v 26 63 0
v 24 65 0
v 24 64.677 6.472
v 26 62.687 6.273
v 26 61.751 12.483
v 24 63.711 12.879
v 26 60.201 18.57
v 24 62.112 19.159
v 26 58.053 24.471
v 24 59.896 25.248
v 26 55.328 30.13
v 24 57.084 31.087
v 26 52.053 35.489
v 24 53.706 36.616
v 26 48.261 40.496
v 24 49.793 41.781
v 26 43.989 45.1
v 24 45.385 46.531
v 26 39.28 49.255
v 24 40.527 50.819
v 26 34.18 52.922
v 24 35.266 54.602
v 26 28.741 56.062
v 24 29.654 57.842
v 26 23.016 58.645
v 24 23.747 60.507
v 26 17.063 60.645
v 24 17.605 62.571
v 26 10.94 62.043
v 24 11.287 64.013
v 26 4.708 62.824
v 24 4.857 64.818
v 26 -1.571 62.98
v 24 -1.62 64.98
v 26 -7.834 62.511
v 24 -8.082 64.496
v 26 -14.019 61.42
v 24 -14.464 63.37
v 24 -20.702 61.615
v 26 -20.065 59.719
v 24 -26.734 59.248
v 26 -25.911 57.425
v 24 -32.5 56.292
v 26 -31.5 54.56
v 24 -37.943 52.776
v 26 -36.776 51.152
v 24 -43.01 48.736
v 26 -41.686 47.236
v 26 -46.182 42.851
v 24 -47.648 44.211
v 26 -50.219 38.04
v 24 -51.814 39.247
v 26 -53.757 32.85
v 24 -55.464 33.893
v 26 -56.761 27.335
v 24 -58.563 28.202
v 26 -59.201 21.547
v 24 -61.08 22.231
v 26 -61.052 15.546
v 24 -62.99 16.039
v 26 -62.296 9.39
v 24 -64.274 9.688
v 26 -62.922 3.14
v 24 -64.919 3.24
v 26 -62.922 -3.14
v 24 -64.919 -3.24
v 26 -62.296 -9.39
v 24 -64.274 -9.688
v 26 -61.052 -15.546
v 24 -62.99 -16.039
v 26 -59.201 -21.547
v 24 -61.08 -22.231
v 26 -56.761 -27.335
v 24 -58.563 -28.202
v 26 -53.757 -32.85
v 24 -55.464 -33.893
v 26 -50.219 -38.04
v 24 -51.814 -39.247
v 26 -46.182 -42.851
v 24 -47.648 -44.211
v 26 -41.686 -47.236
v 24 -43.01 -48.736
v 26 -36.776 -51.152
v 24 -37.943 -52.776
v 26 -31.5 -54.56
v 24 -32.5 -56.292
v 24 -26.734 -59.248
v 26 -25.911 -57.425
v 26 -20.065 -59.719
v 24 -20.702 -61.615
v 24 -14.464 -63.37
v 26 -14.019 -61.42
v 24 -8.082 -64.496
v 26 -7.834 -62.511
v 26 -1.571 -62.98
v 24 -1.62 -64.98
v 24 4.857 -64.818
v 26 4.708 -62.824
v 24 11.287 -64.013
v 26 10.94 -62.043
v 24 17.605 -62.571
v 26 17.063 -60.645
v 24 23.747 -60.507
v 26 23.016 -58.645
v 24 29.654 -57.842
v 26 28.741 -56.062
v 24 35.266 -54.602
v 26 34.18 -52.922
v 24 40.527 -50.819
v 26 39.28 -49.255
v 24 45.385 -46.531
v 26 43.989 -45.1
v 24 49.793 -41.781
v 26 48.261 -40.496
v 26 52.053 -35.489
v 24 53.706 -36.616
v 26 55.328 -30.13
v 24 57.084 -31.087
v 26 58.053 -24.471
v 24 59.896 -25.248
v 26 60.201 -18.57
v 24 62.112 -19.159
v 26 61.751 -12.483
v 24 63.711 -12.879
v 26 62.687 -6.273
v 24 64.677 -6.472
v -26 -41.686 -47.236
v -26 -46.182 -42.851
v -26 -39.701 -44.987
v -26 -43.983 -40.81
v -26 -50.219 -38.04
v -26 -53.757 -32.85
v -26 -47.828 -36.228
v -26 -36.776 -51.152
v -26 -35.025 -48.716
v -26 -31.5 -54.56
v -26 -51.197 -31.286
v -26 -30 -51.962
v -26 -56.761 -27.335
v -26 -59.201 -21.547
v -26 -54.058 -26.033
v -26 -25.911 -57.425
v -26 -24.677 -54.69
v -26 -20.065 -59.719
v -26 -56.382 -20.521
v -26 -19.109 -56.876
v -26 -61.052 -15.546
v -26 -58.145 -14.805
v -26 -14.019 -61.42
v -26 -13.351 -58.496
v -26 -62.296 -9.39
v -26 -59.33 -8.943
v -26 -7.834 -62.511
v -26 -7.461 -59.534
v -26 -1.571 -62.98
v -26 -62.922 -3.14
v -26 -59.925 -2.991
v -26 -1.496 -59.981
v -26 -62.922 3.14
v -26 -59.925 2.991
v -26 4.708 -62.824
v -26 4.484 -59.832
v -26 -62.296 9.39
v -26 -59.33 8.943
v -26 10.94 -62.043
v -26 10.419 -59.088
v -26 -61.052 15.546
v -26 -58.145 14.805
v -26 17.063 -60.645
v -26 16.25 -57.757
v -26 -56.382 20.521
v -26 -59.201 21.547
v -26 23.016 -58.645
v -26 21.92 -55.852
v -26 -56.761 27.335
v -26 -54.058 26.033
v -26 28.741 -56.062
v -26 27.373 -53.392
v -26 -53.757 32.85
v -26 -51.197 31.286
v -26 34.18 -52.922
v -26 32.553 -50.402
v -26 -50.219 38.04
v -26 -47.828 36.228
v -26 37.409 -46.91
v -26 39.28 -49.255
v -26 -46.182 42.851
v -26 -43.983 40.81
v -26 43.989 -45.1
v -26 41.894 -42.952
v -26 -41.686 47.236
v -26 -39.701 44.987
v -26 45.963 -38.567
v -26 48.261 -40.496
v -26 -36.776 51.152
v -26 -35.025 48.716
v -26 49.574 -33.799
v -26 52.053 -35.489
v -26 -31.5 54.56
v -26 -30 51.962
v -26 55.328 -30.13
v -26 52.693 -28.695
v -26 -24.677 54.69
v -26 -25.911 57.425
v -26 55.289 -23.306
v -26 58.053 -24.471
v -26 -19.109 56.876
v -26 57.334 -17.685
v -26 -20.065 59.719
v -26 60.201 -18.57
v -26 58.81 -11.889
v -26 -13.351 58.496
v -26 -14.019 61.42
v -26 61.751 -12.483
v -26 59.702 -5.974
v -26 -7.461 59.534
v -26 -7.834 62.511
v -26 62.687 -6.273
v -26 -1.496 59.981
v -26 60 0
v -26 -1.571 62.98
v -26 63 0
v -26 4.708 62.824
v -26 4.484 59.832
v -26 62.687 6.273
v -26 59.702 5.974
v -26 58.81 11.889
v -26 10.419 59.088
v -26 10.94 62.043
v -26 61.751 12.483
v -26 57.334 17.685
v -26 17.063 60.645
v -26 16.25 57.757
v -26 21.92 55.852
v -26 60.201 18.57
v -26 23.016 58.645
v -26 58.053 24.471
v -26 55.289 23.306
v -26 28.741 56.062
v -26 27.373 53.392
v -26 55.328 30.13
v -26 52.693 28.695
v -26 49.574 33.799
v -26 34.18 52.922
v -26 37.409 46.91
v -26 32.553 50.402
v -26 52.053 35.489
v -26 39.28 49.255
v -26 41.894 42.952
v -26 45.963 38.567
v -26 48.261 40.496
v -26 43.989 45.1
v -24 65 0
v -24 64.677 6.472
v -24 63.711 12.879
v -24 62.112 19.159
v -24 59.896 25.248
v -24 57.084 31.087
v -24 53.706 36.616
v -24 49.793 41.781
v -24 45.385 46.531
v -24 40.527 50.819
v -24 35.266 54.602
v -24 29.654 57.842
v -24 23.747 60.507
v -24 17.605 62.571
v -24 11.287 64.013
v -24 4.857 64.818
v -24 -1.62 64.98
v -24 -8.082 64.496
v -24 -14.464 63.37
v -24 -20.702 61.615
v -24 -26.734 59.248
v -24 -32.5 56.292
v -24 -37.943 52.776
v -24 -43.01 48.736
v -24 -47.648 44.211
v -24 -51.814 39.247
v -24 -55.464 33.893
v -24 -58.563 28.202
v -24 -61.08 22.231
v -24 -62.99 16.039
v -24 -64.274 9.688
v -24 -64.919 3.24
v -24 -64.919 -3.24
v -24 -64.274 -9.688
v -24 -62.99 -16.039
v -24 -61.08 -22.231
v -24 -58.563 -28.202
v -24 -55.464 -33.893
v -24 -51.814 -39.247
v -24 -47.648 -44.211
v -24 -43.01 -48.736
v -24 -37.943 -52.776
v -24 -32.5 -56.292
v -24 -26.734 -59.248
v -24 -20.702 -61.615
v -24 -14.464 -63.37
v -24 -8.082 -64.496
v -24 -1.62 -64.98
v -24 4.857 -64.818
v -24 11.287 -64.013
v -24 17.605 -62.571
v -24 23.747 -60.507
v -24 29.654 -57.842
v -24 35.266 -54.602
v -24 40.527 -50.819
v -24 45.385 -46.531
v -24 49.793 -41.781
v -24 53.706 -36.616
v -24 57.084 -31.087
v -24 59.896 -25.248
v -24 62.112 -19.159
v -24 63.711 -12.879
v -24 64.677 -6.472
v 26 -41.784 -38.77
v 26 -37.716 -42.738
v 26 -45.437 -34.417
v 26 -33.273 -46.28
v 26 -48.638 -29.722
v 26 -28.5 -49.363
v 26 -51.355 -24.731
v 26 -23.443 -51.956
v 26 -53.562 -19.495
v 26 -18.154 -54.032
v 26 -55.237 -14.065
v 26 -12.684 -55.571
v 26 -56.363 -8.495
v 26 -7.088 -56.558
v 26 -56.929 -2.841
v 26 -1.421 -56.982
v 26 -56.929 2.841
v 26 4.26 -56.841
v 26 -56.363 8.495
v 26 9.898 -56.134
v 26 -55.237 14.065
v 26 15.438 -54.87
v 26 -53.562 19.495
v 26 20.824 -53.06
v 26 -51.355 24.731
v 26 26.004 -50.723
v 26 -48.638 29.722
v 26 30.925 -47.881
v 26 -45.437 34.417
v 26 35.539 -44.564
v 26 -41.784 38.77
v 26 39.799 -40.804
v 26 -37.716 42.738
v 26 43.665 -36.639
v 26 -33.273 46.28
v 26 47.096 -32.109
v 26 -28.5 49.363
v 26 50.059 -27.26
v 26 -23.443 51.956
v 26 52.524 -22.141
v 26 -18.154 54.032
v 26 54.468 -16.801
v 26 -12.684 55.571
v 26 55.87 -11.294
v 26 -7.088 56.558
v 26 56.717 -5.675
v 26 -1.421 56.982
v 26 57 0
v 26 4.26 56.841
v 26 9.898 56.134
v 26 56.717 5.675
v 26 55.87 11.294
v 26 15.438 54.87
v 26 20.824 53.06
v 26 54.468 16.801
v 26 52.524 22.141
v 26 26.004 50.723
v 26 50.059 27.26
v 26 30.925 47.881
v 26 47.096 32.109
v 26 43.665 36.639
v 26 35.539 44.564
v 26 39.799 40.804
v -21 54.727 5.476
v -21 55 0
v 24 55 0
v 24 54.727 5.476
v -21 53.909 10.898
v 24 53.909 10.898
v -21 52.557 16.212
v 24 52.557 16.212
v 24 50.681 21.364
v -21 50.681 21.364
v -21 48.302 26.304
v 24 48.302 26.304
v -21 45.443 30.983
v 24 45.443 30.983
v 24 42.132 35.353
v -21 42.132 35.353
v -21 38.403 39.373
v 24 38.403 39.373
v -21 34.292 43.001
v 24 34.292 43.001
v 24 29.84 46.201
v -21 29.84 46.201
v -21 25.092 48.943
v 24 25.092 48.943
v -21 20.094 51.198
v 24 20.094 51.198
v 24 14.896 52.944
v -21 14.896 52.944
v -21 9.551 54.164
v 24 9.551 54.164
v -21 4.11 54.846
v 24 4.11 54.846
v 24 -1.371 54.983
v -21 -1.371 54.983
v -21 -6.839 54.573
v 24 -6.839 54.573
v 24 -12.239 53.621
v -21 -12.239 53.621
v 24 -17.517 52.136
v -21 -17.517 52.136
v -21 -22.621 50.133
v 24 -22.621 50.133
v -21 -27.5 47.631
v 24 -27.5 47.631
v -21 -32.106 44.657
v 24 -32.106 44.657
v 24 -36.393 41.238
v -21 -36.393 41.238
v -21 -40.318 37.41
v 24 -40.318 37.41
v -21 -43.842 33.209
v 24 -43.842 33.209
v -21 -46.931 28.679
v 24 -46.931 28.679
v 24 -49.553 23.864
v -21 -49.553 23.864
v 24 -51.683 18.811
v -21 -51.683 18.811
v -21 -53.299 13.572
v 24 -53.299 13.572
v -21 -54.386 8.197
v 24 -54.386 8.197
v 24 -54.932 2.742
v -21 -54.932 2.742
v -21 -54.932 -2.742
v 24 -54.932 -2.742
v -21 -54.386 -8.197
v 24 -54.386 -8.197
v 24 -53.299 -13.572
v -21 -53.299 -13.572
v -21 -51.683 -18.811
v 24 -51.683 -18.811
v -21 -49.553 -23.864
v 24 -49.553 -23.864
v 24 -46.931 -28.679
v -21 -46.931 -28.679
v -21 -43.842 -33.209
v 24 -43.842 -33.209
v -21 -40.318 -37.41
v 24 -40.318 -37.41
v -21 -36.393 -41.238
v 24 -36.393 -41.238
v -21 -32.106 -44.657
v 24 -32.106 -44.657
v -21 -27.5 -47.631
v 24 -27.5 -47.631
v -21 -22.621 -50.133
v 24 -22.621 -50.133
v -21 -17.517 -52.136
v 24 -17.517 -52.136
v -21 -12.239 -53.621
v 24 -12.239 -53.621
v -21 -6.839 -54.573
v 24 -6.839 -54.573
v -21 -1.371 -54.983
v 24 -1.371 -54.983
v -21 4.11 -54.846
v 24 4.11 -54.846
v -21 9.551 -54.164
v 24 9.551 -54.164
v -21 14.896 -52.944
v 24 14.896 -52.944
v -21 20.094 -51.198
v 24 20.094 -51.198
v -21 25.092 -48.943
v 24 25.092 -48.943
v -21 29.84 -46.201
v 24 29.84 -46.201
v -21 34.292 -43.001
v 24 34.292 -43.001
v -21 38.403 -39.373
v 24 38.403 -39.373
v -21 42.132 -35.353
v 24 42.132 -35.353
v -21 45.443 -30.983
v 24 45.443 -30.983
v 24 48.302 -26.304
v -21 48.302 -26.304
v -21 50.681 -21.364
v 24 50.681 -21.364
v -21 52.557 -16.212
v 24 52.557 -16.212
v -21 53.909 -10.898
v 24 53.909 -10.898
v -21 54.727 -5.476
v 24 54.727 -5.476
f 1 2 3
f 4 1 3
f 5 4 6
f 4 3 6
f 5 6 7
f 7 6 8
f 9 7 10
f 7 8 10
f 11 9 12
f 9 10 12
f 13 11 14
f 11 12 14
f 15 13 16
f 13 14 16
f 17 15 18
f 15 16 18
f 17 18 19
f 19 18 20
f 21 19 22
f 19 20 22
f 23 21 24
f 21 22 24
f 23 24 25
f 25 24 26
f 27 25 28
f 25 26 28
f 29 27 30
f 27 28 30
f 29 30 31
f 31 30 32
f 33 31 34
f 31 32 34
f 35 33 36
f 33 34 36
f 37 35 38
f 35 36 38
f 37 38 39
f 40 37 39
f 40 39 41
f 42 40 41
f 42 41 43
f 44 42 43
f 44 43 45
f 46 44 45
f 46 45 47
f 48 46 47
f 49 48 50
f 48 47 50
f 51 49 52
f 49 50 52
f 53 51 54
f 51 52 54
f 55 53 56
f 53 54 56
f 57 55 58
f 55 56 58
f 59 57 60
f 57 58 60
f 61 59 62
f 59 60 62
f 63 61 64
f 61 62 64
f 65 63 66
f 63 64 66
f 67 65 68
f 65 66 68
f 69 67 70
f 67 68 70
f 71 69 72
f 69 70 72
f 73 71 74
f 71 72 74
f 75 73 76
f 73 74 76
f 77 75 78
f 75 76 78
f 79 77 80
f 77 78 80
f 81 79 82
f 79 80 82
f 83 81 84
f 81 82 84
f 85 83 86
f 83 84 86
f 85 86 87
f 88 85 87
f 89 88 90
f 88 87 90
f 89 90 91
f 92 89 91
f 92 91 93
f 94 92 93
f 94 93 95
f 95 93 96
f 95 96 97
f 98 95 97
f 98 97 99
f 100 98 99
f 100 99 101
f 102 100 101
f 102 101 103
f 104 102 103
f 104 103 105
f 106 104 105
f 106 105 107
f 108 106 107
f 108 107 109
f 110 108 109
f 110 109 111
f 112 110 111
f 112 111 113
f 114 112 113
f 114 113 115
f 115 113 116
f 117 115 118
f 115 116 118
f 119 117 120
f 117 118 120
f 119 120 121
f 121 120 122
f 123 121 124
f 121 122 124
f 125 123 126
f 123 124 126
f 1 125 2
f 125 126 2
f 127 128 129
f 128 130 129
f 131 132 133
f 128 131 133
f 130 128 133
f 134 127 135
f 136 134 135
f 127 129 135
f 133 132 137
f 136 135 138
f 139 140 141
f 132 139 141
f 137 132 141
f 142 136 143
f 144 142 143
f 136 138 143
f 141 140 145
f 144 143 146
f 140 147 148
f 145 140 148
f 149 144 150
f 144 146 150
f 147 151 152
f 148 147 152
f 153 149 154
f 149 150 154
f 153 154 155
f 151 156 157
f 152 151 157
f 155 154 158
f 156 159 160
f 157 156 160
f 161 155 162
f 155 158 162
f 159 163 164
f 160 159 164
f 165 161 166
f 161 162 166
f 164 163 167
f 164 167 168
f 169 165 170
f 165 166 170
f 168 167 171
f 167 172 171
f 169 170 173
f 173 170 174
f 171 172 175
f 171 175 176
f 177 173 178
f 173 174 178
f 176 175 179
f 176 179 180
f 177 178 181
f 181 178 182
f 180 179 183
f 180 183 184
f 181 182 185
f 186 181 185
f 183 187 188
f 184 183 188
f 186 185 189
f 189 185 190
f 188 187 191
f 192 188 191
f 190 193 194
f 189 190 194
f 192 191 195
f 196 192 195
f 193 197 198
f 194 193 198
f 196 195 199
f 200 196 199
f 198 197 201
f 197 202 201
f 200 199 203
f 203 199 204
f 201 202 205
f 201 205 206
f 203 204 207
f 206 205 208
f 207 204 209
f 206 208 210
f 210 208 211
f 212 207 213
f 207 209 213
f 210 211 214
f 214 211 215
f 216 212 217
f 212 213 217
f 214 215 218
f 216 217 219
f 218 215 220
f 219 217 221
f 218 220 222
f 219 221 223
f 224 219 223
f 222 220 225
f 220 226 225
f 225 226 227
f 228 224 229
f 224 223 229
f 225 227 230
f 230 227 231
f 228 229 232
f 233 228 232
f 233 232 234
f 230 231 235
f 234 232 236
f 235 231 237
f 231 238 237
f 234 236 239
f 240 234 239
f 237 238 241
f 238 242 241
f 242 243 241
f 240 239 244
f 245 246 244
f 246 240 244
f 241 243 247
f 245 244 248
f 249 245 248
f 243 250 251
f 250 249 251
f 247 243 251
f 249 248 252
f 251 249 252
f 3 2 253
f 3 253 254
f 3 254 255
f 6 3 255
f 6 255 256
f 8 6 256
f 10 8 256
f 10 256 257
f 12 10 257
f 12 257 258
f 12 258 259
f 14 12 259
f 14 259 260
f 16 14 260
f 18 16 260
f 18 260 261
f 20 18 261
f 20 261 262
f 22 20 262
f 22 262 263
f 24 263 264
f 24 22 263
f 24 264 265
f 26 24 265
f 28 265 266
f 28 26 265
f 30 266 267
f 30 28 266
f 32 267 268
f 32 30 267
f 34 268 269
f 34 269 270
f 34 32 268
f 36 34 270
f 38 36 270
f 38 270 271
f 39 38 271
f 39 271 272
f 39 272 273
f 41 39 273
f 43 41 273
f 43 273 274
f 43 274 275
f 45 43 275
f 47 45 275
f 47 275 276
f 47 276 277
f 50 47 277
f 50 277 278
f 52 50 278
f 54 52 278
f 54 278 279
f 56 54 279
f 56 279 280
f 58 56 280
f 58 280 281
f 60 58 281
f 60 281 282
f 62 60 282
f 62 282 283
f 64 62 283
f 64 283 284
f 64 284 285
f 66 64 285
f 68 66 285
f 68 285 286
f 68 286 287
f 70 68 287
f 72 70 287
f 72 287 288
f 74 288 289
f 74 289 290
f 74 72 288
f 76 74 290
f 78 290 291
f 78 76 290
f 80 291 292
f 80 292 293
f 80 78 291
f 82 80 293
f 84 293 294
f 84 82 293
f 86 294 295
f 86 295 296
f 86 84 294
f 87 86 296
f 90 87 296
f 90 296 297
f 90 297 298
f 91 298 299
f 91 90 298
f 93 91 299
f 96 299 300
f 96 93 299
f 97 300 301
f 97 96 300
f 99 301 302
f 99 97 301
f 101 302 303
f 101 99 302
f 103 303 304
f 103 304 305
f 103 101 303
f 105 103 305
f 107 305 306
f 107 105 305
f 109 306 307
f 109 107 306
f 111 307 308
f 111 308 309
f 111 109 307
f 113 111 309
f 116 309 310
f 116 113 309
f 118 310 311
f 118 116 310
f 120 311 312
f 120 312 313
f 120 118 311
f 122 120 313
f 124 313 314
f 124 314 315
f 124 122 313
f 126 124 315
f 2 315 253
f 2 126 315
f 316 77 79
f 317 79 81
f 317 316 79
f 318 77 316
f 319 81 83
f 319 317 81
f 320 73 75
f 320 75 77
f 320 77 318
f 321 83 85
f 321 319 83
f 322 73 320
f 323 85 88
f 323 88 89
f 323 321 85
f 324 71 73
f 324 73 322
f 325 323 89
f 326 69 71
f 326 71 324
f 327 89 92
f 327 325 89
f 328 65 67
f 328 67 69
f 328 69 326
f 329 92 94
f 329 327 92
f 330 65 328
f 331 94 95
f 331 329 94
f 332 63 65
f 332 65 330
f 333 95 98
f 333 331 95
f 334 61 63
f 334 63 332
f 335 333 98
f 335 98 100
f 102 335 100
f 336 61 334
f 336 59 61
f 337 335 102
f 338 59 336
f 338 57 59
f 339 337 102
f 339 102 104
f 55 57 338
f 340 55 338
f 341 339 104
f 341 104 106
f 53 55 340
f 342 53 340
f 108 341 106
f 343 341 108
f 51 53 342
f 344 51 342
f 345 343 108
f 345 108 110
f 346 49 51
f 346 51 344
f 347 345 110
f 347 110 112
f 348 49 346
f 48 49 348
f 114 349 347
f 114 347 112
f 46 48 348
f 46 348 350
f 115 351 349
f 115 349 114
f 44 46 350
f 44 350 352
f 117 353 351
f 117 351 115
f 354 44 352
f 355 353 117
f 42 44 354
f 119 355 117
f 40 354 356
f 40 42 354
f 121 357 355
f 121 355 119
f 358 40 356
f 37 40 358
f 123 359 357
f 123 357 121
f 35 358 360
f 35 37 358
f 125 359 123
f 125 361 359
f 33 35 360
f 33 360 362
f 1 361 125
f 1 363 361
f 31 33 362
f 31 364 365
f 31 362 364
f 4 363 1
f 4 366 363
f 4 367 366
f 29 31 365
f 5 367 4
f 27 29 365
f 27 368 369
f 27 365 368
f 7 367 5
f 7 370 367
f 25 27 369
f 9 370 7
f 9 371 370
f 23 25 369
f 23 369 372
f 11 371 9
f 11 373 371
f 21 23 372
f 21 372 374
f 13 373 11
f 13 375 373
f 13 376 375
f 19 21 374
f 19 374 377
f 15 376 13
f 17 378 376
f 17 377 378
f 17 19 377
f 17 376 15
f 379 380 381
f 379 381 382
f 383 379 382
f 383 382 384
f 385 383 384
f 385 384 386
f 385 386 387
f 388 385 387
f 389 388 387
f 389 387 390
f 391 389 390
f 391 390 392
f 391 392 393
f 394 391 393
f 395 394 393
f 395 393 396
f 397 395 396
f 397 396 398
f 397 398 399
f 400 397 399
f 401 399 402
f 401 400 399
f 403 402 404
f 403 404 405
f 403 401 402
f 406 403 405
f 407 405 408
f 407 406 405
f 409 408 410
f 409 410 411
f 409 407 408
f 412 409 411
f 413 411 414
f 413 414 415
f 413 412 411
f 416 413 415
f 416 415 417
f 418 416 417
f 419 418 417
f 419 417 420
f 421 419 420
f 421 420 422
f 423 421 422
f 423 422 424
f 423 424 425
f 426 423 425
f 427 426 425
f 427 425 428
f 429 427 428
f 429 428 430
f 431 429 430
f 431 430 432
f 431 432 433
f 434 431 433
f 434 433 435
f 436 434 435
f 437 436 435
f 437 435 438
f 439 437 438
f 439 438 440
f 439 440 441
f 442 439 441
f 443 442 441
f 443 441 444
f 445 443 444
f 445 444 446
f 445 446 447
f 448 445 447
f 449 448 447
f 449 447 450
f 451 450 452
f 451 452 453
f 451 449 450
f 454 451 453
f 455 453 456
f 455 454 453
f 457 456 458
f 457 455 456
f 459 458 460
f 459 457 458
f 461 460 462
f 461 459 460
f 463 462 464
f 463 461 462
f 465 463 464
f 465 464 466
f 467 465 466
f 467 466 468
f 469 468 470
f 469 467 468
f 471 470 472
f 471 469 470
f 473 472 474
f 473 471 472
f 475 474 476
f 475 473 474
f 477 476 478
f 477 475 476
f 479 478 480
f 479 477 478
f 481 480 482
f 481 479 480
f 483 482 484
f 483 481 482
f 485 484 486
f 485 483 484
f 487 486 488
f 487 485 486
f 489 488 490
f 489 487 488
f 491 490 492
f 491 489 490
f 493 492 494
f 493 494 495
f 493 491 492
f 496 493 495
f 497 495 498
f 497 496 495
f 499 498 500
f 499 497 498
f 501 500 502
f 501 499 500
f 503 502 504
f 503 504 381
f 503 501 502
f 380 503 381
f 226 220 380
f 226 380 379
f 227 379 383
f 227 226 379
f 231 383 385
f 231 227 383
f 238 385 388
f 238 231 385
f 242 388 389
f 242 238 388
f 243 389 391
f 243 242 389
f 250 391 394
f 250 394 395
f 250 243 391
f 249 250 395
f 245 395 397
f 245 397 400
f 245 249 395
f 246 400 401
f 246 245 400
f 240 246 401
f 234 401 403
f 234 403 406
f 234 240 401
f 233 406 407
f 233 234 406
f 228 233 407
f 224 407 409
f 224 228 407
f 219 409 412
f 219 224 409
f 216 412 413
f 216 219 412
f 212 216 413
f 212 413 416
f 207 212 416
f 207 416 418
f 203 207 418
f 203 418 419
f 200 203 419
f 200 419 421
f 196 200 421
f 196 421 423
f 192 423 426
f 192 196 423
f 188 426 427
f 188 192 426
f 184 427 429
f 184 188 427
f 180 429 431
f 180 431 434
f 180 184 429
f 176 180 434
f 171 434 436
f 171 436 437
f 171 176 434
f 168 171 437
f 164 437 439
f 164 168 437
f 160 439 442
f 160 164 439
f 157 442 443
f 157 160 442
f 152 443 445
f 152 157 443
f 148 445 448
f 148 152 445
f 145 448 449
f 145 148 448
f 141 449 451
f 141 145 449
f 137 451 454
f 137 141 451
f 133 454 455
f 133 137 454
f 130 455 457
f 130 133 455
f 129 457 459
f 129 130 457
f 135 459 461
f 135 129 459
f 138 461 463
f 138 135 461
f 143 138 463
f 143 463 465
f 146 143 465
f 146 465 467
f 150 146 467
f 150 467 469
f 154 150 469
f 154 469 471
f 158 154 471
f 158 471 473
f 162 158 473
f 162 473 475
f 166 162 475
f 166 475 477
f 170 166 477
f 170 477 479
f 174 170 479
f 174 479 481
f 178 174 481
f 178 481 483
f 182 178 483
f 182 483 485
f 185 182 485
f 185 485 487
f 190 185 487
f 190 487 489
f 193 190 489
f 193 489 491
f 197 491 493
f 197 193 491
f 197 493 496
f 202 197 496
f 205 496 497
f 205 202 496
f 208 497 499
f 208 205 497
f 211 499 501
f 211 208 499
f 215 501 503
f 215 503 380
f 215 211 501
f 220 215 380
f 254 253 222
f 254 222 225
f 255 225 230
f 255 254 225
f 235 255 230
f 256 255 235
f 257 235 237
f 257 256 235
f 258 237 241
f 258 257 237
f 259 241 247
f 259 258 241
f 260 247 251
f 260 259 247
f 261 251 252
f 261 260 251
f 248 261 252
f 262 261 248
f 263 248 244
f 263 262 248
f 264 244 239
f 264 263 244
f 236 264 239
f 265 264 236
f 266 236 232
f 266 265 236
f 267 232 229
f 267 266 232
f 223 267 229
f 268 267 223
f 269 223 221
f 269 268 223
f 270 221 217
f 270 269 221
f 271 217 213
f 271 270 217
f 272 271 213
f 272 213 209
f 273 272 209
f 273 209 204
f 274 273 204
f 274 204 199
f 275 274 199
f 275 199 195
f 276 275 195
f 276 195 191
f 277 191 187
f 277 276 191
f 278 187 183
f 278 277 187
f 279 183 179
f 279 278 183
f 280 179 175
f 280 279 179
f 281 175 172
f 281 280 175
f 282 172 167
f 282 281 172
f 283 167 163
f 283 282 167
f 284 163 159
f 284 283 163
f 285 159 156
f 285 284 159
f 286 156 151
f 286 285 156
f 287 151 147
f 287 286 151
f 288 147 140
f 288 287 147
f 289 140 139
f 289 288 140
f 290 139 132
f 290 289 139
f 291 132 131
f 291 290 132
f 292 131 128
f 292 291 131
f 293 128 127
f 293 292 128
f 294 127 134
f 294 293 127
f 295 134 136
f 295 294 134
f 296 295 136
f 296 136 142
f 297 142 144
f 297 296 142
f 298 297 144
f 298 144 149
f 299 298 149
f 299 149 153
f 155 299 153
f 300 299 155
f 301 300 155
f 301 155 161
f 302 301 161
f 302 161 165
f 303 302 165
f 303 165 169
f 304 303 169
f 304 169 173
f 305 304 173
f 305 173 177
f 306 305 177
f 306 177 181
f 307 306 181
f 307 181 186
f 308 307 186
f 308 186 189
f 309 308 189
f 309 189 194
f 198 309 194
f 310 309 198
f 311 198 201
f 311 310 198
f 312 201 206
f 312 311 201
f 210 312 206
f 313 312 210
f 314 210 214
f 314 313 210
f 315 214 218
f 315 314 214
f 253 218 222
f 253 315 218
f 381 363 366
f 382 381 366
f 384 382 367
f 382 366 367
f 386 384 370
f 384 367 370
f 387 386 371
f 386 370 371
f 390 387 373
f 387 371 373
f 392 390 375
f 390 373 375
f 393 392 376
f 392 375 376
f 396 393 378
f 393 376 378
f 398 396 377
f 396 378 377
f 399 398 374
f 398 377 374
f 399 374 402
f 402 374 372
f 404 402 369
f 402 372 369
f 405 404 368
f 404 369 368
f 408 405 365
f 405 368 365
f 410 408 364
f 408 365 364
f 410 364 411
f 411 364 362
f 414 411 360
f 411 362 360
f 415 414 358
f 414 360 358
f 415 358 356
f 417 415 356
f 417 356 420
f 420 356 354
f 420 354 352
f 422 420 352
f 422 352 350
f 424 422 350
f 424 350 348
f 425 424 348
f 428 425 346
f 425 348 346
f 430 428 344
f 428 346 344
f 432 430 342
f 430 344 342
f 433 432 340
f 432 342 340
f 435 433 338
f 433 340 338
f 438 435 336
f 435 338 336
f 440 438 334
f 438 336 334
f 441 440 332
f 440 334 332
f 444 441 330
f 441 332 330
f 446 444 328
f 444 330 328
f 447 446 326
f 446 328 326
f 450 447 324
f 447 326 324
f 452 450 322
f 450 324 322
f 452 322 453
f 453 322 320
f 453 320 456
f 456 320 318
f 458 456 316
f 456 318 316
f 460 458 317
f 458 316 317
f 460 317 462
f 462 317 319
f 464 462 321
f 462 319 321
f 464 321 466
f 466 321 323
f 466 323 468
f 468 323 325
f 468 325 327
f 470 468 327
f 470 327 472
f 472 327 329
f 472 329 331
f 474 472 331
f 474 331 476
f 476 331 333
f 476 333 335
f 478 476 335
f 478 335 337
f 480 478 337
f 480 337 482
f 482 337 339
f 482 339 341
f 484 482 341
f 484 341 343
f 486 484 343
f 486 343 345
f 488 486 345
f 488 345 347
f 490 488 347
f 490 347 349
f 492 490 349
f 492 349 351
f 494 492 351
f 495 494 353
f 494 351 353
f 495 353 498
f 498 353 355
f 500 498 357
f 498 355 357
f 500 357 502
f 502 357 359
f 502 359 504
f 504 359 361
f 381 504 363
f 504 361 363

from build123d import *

# Parameters (mm, degrees)
F0_R     = 65
F0_R_2   = 55
F1_DEPTH = 26
F2_SIZE  = 5
F3_SIZE  = 2


with BuildPart() as f1:
    # F0 (on Right) → F1 (new body, symmetric)
    with BuildSketch(Plane.YZ):
        Circle(F0_R)
        Circle(F0_R_2, mode=Mode.SUBTRACT)
    extrude(amount=F1_DEPTH, both=True)

    # F2
    f2_edges = [f1.edges().sort_by_distance(p)[0] for p in [
        (-26, -55, 0),
    ]]
    chamfer(f2_edges, length=F2_SIZE)

    # F3
    f3_edges = [f1.edges().sort_by_distance(p)[0] for p in [
        (-26, -65, 0),
        (26, -65, 0),
        (26, -55, 0),
    ]]
    chamfer(f3_edges, length=F3_SIZE)


solid = f1.part
